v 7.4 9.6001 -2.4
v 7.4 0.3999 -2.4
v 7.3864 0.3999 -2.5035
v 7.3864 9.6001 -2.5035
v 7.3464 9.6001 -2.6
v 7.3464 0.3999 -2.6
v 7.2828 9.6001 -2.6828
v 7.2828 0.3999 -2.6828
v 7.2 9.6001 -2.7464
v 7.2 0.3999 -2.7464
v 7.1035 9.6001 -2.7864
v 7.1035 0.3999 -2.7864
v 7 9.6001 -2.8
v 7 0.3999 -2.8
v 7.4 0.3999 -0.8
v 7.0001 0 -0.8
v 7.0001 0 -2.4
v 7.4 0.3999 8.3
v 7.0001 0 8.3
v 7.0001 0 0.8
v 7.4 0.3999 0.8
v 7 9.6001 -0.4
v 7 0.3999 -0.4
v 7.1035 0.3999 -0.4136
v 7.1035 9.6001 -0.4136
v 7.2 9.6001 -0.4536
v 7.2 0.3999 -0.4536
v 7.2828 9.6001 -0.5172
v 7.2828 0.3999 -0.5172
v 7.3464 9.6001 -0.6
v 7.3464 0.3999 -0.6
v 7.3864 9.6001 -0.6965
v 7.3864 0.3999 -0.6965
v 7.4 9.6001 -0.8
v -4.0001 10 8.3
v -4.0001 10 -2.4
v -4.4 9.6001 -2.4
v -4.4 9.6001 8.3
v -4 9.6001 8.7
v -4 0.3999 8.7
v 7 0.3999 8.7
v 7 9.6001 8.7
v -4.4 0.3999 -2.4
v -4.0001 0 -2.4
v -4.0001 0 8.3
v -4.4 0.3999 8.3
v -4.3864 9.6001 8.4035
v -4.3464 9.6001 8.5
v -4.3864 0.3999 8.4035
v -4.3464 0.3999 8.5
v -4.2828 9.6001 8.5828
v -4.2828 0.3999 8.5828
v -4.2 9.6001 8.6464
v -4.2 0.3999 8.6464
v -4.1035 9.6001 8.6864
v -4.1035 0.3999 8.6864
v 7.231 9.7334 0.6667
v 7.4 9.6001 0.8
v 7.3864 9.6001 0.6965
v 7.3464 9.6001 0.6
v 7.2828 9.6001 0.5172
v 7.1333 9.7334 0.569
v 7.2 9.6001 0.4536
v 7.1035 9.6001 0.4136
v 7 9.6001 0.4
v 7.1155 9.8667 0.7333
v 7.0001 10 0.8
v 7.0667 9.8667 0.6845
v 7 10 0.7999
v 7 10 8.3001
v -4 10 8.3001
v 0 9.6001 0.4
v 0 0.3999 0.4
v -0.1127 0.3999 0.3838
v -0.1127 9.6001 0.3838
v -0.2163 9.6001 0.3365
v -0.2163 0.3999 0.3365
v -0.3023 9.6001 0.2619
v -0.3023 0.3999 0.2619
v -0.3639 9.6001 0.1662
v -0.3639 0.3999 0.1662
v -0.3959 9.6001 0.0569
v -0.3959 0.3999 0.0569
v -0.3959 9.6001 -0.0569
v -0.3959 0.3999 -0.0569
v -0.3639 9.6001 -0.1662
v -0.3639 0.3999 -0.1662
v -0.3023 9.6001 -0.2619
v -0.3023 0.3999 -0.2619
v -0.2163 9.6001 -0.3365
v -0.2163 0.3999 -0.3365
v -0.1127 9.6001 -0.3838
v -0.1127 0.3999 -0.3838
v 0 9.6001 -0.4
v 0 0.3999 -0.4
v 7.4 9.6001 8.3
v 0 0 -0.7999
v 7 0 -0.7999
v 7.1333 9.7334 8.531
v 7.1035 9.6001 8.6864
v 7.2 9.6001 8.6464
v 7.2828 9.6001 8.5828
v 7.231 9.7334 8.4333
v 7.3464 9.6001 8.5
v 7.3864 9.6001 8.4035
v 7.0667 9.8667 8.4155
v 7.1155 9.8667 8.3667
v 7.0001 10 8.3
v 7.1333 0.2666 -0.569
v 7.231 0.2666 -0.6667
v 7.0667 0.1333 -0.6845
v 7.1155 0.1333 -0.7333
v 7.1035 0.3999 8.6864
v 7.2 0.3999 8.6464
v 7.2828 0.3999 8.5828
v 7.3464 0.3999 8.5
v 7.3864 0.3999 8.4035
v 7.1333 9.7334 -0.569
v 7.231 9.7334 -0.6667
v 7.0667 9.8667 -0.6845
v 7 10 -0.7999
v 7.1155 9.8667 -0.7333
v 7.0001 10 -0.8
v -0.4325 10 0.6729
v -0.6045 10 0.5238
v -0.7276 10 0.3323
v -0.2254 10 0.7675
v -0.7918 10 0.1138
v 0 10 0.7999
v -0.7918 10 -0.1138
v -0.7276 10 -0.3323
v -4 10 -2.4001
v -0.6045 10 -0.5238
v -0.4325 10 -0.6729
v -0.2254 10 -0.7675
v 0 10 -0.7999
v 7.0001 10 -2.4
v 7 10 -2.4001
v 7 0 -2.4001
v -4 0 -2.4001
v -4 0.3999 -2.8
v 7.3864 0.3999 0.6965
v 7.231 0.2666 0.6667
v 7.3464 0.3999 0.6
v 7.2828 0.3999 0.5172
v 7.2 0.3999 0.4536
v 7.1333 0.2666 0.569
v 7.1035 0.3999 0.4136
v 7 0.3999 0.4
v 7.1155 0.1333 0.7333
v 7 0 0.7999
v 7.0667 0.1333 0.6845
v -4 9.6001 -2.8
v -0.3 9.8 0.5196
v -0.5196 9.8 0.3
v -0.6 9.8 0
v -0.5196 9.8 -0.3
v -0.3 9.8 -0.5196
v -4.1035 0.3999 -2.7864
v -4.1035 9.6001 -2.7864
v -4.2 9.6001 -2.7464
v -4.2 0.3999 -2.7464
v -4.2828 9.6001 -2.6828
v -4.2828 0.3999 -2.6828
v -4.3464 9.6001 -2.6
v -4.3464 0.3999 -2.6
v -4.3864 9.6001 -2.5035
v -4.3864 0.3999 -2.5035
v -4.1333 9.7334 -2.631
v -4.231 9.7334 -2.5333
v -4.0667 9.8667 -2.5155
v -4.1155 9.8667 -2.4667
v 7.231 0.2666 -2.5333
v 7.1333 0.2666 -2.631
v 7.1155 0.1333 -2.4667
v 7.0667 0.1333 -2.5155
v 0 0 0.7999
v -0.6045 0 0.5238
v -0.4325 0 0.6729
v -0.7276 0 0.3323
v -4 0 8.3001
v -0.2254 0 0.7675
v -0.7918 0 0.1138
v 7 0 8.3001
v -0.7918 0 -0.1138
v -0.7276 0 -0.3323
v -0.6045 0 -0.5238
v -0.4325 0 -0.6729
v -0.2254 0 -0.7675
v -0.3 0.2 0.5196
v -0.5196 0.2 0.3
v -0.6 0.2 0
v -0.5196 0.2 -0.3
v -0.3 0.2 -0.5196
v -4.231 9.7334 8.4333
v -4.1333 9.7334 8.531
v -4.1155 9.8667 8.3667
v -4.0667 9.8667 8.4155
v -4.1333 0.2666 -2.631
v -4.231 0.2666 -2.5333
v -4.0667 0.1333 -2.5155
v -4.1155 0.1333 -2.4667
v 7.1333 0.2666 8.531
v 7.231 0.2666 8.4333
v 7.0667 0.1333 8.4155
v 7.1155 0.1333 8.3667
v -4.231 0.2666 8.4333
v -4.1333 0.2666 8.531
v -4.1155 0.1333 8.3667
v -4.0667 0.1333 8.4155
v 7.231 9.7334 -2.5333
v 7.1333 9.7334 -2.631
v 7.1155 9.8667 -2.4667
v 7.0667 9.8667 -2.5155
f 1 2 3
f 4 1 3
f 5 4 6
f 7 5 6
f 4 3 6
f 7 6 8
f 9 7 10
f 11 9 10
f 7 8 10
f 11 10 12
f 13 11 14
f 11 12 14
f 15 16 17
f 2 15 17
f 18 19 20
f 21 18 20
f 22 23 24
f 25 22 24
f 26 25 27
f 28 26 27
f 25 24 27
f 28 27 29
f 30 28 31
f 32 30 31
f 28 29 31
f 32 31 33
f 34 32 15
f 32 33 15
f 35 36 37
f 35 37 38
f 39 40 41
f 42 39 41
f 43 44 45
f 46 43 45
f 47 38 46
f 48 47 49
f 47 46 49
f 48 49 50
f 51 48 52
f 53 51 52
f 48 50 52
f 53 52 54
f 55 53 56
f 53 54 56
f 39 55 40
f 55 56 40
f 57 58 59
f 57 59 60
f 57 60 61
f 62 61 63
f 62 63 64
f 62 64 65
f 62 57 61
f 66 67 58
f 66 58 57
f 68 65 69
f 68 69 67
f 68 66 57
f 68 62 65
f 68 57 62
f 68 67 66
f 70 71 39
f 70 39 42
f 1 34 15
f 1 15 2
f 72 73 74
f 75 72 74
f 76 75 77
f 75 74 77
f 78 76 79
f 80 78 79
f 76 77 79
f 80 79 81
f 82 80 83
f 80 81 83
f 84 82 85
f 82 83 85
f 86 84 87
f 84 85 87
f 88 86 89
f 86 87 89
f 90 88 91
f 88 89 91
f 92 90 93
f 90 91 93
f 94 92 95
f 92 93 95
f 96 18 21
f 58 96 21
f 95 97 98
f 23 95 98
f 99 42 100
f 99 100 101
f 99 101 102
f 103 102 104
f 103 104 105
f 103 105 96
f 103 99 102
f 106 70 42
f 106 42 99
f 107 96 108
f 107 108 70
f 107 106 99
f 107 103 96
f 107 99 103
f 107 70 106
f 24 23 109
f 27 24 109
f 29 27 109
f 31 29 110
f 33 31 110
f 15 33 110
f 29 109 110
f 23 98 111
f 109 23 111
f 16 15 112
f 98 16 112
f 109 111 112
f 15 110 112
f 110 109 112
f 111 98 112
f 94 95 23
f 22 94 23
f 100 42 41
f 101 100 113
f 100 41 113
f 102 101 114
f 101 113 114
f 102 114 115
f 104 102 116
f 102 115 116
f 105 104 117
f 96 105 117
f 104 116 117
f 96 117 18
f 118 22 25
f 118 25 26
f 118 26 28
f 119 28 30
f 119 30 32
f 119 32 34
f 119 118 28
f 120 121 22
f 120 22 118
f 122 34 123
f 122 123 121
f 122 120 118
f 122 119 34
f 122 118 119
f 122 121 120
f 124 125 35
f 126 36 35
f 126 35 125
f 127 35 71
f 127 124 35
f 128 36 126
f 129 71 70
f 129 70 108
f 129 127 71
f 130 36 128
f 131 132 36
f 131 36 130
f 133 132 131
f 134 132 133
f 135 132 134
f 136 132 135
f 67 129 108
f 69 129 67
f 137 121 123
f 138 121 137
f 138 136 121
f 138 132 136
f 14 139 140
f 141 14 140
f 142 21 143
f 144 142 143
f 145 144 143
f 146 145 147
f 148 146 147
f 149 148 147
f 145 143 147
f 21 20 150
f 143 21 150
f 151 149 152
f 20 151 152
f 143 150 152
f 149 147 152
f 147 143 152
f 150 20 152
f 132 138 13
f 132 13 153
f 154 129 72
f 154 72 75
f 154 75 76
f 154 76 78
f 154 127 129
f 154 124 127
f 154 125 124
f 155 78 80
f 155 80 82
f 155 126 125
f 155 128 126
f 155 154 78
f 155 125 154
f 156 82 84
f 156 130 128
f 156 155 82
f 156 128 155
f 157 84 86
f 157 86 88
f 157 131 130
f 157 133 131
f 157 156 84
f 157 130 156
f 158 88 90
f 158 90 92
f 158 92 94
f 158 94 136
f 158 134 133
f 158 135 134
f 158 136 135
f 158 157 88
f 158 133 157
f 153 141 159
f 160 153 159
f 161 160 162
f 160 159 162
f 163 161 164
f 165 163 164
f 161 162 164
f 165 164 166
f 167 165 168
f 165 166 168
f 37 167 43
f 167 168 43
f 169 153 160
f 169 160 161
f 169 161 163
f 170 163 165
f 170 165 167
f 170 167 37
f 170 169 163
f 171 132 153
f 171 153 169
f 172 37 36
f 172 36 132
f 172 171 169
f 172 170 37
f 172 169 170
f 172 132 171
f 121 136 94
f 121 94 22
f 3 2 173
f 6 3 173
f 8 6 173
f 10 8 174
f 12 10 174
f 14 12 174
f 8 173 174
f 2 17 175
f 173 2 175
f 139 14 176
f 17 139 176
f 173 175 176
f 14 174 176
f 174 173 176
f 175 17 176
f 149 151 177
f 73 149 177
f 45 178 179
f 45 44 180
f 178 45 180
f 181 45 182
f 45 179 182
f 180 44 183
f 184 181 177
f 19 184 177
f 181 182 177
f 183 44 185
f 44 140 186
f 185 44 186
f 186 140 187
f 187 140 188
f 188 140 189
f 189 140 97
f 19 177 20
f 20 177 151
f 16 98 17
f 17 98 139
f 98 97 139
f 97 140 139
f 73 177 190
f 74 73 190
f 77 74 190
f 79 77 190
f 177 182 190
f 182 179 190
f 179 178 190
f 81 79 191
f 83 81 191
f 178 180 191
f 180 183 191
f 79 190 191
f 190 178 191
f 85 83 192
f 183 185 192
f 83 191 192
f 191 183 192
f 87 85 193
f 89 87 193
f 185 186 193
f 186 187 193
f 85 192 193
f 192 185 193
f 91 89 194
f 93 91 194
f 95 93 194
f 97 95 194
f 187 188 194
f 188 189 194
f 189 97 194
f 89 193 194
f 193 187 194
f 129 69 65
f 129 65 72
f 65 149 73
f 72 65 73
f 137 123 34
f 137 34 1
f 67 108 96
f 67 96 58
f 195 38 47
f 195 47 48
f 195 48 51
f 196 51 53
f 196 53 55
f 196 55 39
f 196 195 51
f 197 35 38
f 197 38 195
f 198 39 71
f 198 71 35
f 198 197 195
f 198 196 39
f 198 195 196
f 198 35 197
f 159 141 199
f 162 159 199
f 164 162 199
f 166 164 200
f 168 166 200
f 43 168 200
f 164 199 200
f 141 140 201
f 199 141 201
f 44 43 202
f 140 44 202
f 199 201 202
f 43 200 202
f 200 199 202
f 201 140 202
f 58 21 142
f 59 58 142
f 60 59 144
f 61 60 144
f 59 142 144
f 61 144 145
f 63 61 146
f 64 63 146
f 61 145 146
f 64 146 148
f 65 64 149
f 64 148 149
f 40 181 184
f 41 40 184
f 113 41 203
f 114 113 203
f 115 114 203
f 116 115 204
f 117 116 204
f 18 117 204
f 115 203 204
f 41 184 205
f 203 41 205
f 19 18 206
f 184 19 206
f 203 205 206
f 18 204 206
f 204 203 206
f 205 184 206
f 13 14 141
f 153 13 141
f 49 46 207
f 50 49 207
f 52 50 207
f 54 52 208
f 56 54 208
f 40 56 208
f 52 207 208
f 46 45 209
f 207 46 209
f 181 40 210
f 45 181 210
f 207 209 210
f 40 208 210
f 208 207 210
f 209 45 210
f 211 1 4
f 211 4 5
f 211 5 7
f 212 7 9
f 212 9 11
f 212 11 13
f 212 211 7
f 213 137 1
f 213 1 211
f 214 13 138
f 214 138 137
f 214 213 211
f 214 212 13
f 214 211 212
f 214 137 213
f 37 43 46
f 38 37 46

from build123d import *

# Parameters (mm, degrees)
BOSS_EXTRUDE1_DEPTH = 10
CHAMFER1_SIZE       = 0.4


with BuildPart() as part:
    # Sketch1 → Boss-Extrude1 (new body)
    with BuildSketch(Plane(origin=(0, 0, 0), x_dir=(1, 0, 0), z_dir=(0, 1, 0))):
        with BuildLine():
            Line((0, 0.4), (7, 0.4))
            ThreePointArc((7, 0.4), (7.282842712, 0.517157288), (7.4, 0.8))
            Line((7.4, 0.8), (7.4, 2.4))
            ThreePointArc((7.4, 2.4), (7.282842712, 2.682842712), (7, 2.8))
            Line((7, 2.8), (-4, 2.8))
            ThreePointArc((-4, 2.8), (-4.282842712, 2.682842712), (-4.4, 2.4))
            Line((-4.4, 2.4), (-4.4, -8.3))
            ThreePointArc((-4.4, -8.3), (-4.282842712, -8.582842712), (-4, -8.7))
            Line((-4, -8.7), (7, -8.7))
            ThreePointArc((7, -8.7), (7.282842712, -8.582842712), (7.4, -8.3))
            Line((7.4, -8.3), (7.4, -0.8))
            ThreePointArc((7.4, -0.8), (7.282842712, -0.517157288), (7, -0.4))
            Line((7, -0.4), (0, -0.4))
            ThreePointArc((0, -0.4), (-0.4, 0), (0, 0.4))
        make_face()
    extrude(amount=BOSS_EXTRUDE1_DEPTH)

    # Chamfer1
    chamfer1_edges = [part.edges().sort_by_distance(p)[0] for p in [
        (7.282842712, 10, -0.517157288),
        (3.5, 0, 0.4),
        (7.282842712, 0, 0.517157288),
        (7.4, 0, 4.55),
        (7.282842712, 0, 8.582842712),
        (1.5, 0, 8.7),
        (-4.282842712, 0, 8.582842712),
        (-4.4, 0, 2.95),
        (-4.282842712, 0, -2.682842712),
        (7.4, 10, -1.6),
        (1.5, 0, -2.8),
        (7.282842712, 0, -2.682842712),
        (7.4, 0, -1.6),
        (7.282842712, 0, -0.517157288),
        (3.5, 0, -0.4),
        (-0.4, 0, 0),
        (7.282842712, 10, -2.682842712),
        (1.5, 10, -2.8),
        (-4.282842712, 10, -2.682842712),
        (-4.4, 10, 2.95),
        (-4.282842712, 10, 8.582842712),
        (1.5, 10, 8.7),
        (7.282842712, 10, 8.582842712),
        (7.4, 10, 4.55),
        (-0.4, 10, 0),
        (7.282842712, 10, 0.517157288),
        (3.5, 10, 0.4),
        (3.5, 10, -0.4),
    ]]
    chamfer(chamfer1_edges, length=CHAMFER1_SIZE - 0.0001)  # a hair under: the kernel refuses the full size


solid = part.part
